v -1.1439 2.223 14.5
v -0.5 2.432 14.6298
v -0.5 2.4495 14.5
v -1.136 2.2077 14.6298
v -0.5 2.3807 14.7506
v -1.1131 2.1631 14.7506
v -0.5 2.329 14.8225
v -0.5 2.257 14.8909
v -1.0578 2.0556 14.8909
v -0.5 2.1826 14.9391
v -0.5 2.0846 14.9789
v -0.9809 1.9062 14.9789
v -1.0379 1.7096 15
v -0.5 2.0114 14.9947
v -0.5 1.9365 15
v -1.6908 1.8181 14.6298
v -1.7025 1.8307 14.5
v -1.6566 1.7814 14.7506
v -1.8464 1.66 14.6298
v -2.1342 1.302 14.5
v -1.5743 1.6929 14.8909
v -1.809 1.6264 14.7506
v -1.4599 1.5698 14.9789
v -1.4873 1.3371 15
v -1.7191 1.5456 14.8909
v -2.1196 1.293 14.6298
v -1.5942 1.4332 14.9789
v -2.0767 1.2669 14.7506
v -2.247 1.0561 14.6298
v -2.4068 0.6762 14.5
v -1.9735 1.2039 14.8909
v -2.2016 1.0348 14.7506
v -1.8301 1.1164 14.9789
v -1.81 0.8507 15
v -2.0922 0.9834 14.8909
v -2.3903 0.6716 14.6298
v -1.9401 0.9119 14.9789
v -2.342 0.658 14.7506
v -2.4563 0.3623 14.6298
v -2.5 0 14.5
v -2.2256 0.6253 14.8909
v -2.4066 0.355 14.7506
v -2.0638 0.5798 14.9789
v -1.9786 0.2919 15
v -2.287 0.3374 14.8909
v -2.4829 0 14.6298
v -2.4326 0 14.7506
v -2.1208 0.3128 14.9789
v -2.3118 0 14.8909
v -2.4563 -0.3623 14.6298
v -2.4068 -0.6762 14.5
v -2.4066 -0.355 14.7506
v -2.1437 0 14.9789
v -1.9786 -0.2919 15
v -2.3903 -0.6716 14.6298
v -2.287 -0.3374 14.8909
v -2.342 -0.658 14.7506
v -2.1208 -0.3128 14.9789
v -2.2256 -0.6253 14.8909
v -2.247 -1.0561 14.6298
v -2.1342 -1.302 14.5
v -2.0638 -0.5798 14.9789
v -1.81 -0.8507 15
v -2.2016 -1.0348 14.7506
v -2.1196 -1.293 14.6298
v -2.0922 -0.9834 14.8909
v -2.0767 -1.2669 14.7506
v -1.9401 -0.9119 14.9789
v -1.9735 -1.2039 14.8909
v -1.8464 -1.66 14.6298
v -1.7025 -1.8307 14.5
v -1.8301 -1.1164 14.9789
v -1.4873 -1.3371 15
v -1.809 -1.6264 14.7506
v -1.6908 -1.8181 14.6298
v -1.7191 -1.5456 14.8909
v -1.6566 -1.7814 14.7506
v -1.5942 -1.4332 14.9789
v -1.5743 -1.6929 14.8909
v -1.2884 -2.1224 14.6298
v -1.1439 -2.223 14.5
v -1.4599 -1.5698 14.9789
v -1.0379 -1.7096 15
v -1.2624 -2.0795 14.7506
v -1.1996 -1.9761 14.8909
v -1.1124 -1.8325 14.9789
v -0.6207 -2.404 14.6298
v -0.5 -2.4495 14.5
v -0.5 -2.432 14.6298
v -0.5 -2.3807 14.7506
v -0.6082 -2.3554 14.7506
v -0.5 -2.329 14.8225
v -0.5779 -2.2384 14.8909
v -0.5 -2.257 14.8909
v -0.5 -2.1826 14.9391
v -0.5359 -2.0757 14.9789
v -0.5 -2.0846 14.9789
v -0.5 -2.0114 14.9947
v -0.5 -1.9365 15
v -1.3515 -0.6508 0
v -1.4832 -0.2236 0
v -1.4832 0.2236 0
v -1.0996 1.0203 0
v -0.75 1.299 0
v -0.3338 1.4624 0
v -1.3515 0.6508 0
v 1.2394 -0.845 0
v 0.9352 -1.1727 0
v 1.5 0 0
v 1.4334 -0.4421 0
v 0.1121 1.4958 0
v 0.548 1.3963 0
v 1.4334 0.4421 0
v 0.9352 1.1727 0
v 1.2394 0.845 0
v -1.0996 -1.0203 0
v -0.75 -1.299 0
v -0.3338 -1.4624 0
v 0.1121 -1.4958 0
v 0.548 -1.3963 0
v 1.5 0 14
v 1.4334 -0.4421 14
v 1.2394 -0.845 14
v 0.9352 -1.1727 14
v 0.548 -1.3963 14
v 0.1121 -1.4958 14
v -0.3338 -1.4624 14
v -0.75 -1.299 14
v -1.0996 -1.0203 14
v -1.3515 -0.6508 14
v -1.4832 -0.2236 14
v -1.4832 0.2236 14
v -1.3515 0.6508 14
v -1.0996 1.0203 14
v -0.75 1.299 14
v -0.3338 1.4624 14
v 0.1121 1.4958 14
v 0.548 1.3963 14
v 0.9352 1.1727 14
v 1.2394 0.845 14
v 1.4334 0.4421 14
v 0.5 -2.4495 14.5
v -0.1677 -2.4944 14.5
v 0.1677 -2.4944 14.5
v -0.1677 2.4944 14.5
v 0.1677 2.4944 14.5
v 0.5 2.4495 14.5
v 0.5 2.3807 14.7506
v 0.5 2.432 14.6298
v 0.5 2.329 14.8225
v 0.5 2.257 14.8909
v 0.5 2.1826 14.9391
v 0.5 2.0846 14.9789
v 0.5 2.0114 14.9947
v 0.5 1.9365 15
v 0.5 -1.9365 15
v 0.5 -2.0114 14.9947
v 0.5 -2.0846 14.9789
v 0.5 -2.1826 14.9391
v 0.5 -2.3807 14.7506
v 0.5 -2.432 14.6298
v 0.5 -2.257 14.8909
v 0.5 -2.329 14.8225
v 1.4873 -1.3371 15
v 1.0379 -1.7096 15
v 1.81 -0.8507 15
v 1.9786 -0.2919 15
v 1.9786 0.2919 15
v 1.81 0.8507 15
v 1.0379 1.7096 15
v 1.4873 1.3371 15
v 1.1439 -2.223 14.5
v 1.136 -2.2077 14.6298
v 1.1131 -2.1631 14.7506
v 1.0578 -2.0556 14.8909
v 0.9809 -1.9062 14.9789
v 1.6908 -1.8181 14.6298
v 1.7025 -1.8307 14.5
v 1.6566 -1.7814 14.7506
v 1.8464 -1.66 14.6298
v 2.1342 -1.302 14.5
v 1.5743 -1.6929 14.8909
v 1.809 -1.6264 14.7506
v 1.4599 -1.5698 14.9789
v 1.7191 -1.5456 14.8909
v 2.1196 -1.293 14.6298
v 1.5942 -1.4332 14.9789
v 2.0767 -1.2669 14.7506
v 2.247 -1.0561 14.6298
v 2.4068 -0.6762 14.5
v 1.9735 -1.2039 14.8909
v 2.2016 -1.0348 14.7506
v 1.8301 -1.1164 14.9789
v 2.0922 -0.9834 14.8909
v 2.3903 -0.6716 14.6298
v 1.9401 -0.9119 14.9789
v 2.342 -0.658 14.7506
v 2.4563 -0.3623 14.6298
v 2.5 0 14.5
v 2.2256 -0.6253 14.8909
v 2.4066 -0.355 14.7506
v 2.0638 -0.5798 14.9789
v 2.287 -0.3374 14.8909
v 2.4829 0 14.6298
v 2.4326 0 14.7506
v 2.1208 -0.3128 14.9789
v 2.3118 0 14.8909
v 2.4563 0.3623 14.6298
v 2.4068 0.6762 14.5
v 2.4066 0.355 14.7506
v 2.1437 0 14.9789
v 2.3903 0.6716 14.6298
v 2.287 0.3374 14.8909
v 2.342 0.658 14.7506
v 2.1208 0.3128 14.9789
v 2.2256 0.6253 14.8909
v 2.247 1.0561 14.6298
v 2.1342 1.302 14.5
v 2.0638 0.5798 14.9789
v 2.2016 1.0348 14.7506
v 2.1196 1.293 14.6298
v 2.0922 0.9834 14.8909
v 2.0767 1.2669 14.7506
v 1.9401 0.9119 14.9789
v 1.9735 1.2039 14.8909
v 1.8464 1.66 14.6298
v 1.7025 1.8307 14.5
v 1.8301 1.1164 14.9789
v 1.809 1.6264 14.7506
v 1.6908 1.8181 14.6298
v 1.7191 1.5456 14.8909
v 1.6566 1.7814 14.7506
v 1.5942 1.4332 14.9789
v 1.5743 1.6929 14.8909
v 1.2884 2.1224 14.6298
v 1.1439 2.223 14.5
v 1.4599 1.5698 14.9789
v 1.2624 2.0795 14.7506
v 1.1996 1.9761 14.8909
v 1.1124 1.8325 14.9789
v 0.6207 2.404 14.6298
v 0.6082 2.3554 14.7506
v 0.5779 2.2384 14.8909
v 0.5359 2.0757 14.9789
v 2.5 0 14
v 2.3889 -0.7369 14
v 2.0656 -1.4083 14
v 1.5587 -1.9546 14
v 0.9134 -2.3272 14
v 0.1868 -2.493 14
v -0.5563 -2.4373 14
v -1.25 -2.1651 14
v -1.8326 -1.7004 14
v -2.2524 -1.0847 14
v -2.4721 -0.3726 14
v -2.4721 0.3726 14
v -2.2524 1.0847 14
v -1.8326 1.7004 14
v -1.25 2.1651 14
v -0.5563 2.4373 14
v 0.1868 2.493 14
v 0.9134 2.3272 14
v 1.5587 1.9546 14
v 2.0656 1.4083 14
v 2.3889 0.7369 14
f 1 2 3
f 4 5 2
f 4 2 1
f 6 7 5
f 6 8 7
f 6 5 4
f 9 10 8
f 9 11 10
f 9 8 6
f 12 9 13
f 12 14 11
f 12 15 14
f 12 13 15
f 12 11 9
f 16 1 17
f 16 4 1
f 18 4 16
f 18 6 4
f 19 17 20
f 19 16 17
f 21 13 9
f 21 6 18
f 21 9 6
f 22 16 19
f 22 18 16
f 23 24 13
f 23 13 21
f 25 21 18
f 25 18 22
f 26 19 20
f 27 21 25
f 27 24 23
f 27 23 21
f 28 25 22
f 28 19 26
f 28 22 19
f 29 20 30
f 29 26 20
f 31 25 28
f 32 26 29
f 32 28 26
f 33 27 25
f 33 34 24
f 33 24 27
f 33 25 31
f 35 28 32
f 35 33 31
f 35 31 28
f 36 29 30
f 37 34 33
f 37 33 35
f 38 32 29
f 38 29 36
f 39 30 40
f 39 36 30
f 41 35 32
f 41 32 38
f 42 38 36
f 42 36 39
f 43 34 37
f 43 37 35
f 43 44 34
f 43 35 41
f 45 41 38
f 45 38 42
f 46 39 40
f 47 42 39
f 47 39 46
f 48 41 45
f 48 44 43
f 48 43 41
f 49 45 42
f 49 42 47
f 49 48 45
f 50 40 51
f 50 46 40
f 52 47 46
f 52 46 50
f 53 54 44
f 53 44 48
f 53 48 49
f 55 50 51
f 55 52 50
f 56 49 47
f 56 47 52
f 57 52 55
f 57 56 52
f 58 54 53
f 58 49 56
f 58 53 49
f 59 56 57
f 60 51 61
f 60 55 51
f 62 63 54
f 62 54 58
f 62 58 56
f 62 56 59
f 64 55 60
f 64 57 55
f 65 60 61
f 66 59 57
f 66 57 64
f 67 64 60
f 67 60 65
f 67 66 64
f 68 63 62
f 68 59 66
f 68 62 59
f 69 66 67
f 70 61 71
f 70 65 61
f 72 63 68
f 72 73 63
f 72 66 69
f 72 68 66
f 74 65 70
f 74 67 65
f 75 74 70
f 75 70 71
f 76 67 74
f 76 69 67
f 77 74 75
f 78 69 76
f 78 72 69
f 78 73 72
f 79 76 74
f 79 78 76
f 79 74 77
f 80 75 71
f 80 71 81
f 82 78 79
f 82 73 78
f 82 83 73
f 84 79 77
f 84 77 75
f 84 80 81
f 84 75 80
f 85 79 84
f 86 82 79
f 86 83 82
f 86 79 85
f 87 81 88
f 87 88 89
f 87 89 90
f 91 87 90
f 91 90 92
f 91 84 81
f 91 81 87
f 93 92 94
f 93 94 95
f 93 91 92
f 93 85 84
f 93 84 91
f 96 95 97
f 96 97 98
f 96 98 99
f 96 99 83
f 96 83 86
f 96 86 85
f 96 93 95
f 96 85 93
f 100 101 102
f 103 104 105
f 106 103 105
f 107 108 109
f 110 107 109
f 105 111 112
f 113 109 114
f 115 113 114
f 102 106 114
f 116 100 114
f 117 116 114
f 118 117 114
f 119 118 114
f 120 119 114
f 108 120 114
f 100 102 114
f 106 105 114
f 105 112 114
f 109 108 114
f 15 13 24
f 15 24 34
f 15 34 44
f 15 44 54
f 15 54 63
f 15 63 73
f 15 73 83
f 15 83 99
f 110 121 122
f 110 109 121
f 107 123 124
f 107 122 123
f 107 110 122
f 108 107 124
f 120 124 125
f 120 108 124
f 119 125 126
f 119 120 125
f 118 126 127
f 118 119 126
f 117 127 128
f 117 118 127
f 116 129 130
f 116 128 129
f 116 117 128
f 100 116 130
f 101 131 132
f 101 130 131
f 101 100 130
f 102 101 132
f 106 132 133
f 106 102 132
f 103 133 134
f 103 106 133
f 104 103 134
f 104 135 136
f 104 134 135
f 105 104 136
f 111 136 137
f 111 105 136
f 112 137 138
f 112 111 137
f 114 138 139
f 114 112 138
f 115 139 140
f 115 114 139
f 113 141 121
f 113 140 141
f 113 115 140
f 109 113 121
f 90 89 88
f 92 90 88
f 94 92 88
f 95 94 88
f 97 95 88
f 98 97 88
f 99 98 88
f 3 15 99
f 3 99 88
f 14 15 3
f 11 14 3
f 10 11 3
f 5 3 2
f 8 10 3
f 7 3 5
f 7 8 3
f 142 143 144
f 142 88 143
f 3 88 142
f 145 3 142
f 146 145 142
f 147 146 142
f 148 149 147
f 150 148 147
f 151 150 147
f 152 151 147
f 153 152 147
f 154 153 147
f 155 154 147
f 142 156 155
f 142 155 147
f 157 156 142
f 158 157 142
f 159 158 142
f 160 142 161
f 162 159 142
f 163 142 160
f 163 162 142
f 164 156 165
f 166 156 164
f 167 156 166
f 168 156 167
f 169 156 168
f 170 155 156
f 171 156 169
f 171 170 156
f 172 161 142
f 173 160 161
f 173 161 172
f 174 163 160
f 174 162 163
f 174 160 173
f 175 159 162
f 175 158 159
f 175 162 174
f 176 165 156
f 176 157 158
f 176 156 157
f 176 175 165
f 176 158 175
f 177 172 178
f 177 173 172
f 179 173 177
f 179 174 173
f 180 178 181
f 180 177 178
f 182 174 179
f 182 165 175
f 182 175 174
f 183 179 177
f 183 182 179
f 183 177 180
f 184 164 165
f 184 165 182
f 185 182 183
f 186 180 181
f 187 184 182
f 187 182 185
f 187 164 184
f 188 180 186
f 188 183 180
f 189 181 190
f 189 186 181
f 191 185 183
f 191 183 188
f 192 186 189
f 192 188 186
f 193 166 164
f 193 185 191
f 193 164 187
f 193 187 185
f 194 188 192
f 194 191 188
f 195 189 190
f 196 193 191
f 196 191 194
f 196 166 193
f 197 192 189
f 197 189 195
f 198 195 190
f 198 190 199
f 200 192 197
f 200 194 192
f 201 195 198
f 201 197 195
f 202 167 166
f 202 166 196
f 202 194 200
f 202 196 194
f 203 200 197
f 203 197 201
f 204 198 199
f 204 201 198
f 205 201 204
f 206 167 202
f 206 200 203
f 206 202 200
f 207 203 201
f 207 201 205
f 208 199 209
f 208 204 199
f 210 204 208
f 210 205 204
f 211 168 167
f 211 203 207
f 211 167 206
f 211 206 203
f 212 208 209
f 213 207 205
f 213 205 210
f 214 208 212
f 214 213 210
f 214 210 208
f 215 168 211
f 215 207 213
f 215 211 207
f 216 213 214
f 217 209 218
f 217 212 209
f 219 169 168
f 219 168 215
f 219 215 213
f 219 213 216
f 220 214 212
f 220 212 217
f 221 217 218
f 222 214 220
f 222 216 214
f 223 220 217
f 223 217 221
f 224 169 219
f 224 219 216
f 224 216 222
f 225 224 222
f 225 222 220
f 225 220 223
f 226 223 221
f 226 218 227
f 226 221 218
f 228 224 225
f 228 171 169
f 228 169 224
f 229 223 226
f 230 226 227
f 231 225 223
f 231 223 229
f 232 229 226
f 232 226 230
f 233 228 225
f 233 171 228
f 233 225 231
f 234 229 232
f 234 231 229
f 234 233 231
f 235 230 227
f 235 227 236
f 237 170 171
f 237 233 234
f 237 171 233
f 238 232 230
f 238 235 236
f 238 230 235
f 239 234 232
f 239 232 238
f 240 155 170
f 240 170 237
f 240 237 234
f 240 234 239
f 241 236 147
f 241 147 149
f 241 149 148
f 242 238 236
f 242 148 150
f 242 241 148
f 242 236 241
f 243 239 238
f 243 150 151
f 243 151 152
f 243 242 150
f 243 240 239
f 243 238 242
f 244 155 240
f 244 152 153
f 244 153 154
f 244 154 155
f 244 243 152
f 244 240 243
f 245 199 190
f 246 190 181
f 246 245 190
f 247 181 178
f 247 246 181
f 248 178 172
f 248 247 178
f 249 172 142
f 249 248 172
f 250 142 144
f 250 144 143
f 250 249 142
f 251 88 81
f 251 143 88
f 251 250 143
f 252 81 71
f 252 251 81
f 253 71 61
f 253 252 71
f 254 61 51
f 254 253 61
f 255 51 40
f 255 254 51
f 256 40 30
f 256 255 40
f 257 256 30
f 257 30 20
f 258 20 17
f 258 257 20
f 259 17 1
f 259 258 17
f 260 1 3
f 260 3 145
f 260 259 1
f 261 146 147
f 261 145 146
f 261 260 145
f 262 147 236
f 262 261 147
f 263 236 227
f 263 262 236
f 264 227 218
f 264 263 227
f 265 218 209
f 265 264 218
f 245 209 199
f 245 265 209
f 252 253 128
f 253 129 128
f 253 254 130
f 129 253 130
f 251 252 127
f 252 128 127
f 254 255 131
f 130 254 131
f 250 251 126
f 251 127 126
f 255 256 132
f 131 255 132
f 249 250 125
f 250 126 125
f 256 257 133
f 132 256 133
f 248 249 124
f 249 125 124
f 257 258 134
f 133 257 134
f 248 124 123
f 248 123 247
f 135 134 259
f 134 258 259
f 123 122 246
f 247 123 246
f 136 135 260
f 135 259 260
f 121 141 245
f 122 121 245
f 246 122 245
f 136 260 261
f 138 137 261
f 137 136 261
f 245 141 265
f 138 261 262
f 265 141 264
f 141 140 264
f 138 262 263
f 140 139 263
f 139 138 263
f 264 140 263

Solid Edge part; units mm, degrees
sketch "Sketch1" plane through (0, 0, 0) normal (0, 0, 1) x (1, 0, 0)
  circle A0 centre (0, 0) radius 1.5
  dimension "D1" = 3
extrude "Protrusion1" add sketch "Sketch1" along normal blind 14
sketch "Sketch2" plane through (0, 0, 14) normal (0, 0, 1) x (1, 0, 0)
  circle A0 centre (0, 0) radius 2.5
  dimension "D1" = 5
extrude "Head" add sketch "Sketch2" along normal blind 1
fillet "Round___Head" radius 0.5 1 edges at (-2.5, 0, 15)
sketch "Sketch3" plane through (0, 0, 15) normal (0, 0, 1) x (1, 0, 0)
  line L0 (-0.5, -2.4495) -> (-0.5, 2.4495)
  line L1 (0.5, 2.4495) -> (0.5, -2.4495)
  arc A0 (0.5, -2.4495) -> (-0.5, -2.4495) centre (0, 0) cw
  dimension "D1" = 1
  dimension "D2" = 0.5
extrude "Cutout___Head" cut sketch "Sketch3" against normal blind 0.5 material side at (-0.45, 0, 15)
cosmetic_thread "Thread1" size "M3"
properties material "Stainless Steel, 420"
